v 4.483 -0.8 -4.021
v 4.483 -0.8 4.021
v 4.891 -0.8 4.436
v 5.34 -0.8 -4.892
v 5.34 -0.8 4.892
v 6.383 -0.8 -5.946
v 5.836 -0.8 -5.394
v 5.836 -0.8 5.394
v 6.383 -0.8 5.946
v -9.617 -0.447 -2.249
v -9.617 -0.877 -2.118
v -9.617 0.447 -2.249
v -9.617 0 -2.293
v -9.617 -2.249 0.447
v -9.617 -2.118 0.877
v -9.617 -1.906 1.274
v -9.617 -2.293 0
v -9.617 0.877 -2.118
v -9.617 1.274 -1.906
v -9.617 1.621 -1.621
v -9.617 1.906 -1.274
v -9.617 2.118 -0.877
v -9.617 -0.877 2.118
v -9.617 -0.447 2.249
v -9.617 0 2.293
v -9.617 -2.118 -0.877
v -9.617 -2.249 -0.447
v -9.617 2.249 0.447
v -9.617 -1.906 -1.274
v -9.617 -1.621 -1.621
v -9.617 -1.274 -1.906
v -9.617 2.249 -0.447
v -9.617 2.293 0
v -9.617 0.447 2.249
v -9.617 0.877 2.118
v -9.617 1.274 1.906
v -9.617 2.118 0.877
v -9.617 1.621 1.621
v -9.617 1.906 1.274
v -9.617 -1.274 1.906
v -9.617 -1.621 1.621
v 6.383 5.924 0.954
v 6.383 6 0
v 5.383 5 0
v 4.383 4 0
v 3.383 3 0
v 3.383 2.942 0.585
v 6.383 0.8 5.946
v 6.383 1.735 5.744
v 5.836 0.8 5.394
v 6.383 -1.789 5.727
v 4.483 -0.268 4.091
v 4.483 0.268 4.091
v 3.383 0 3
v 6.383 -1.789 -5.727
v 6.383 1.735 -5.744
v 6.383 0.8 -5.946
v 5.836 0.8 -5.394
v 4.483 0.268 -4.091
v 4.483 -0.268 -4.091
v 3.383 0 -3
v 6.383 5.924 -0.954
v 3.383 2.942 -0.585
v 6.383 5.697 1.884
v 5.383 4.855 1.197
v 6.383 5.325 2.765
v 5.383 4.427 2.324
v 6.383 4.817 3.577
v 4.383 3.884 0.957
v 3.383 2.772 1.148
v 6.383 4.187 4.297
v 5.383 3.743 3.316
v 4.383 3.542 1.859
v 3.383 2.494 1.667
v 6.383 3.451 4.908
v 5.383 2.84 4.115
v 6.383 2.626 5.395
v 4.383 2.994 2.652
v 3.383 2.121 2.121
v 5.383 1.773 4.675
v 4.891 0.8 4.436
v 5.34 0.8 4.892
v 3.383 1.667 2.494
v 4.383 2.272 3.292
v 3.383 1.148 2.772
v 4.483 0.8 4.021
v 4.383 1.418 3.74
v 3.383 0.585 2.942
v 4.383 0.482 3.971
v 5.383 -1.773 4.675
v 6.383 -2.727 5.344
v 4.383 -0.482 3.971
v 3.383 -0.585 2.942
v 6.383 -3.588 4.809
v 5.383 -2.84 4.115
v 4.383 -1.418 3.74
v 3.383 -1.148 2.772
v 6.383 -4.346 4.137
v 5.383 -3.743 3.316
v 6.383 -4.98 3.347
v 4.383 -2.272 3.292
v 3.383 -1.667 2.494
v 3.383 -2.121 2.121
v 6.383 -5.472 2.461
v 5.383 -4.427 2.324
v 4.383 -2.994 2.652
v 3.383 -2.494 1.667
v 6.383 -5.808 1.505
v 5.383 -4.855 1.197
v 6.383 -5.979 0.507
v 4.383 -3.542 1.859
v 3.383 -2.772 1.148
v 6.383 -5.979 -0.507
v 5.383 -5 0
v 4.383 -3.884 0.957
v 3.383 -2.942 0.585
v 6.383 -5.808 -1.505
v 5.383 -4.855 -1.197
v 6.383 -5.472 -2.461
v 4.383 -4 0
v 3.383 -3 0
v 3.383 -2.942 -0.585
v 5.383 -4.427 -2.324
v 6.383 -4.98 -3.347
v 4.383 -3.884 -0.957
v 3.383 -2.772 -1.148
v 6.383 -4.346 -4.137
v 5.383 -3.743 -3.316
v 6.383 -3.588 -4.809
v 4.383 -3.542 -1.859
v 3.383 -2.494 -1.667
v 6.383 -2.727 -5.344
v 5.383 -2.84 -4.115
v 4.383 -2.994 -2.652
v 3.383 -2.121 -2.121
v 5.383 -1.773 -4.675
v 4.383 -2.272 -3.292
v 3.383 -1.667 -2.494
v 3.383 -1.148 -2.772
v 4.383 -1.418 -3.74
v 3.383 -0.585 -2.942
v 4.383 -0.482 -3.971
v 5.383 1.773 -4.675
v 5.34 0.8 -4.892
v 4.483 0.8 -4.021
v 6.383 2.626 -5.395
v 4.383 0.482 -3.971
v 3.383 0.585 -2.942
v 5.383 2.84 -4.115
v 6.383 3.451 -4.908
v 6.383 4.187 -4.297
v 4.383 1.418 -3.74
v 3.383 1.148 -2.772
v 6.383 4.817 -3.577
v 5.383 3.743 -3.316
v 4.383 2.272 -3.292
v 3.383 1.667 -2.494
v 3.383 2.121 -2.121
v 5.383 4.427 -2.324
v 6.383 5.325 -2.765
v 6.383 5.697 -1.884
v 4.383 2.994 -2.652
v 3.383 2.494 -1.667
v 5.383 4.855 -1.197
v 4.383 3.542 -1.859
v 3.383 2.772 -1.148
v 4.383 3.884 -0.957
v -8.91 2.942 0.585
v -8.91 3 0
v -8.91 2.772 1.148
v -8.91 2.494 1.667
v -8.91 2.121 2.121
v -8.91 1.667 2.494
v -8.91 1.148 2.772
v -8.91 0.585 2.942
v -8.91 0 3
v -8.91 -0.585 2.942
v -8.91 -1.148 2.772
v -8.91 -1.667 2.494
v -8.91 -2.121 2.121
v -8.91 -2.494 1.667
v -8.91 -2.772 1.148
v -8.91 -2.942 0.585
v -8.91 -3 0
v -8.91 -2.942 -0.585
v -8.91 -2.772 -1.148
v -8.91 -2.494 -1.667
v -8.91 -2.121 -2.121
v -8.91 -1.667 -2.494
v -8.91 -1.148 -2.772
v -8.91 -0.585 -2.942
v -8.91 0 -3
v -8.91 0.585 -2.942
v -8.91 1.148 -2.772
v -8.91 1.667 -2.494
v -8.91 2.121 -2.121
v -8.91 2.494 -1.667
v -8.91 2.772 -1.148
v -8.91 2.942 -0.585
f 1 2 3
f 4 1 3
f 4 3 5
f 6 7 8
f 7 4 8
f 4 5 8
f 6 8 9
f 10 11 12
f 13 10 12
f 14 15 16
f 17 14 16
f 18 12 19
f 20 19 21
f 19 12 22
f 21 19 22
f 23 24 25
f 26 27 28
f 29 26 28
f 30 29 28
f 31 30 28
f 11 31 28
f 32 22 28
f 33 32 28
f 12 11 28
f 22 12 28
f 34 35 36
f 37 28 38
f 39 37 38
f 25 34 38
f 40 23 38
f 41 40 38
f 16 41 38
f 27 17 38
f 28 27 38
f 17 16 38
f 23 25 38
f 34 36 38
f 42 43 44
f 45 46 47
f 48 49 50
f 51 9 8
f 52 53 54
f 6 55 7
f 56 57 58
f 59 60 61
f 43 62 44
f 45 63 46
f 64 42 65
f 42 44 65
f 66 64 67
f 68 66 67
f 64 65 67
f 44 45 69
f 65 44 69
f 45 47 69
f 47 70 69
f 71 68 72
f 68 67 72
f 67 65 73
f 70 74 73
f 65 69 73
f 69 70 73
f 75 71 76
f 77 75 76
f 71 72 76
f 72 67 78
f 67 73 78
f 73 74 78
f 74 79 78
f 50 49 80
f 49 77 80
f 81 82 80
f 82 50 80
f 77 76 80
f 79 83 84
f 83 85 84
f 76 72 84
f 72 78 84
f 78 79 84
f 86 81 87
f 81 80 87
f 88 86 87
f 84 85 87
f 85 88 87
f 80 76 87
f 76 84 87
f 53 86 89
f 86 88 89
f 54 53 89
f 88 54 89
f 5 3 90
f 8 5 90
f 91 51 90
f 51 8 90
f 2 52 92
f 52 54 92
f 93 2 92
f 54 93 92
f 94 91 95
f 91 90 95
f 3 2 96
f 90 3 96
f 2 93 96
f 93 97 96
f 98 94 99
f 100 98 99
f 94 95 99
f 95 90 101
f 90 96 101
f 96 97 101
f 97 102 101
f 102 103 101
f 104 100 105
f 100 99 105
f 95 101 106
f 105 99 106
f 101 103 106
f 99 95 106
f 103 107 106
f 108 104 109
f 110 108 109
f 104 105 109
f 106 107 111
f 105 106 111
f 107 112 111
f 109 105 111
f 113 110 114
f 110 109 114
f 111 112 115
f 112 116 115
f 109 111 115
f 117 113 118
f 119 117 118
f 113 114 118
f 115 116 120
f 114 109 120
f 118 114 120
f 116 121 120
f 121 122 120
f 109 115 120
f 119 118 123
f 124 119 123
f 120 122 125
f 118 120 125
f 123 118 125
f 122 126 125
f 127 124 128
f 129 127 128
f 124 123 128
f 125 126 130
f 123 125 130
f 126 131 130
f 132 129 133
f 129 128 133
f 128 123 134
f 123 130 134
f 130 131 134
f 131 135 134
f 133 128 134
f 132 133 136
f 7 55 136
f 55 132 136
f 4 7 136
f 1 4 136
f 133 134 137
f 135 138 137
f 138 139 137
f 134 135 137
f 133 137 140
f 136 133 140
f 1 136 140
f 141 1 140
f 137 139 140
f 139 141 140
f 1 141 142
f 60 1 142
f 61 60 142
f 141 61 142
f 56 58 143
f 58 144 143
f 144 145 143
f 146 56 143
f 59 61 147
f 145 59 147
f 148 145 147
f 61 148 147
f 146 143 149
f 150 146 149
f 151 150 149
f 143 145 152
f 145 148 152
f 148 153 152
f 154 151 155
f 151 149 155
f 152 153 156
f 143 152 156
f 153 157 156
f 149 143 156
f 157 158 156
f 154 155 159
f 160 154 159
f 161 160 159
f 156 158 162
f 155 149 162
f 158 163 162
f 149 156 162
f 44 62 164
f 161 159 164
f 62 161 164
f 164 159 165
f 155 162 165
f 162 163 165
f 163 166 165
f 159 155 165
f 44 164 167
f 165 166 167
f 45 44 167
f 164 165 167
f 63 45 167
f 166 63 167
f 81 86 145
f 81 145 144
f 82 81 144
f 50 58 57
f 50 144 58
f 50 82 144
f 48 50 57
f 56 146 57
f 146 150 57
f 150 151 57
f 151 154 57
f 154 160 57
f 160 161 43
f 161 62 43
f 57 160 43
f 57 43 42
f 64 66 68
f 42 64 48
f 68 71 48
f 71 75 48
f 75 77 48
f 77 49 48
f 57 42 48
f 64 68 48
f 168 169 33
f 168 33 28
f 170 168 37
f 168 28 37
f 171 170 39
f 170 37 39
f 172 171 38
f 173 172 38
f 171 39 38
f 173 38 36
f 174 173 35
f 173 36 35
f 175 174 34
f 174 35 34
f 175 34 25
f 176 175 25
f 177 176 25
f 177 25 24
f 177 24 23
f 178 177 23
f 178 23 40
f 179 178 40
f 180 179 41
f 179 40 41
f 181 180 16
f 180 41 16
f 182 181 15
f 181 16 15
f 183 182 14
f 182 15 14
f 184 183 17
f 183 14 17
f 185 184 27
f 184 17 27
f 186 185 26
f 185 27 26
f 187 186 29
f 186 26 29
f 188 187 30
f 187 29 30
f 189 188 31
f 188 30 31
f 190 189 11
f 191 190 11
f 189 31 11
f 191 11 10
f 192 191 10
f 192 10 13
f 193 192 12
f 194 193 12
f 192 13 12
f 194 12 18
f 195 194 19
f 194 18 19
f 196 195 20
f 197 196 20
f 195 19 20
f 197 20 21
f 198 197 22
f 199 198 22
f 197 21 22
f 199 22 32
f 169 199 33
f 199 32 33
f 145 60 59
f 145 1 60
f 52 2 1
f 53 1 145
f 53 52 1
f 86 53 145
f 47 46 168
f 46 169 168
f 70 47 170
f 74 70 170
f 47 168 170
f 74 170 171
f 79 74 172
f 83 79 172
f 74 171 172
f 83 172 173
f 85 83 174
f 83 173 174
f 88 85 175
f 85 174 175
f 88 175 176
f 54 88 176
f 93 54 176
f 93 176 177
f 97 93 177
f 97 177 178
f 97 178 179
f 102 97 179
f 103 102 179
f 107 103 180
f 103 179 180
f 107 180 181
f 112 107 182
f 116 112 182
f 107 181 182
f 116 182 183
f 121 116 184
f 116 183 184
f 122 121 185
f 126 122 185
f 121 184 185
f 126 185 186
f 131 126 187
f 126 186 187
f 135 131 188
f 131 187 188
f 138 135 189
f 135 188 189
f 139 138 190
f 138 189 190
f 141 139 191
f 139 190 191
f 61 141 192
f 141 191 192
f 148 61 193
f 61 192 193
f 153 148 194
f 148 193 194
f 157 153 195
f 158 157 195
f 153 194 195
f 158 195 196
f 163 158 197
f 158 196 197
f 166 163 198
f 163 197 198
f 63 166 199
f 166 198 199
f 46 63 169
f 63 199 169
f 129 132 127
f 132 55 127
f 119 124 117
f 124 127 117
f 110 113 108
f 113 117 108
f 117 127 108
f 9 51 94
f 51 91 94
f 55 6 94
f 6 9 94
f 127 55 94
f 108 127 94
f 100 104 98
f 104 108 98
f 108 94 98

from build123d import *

# Parameters (mm, degrees)
SKETCH2_W          = 1.9
SKETCH2_H          = 1.6
CUT_EXTRUDE1_DEPTH = 50


with BuildPart() as part:
    # Sketch1 → Revolve1 (revolve)
    with BuildSketch(Plane.XY):
        Polygon((6.382934587, 0), (6.382934587, 6), (3.382934587, 3), (-8.909958632, 3), (-9.617065413, 2.292893219), (-9.617065413, 0), align=None)
    revolve(axis=Axis((-31.290557053, 0, 0), (1, 0, 0)))

    # Sketch2 → Cut-Extrude1 (cut, symmetric)
    with BuildSketch(Plane.XY):
        with Locations((5.432934587, 0)):
            Rectangle(SKETCH2_W, SKETCH2_H)
    extrude(amount=CUT_EXTRUDE1_DEPTH, both=True, mode=Mode.SUBTRACT)


solid = part.part
